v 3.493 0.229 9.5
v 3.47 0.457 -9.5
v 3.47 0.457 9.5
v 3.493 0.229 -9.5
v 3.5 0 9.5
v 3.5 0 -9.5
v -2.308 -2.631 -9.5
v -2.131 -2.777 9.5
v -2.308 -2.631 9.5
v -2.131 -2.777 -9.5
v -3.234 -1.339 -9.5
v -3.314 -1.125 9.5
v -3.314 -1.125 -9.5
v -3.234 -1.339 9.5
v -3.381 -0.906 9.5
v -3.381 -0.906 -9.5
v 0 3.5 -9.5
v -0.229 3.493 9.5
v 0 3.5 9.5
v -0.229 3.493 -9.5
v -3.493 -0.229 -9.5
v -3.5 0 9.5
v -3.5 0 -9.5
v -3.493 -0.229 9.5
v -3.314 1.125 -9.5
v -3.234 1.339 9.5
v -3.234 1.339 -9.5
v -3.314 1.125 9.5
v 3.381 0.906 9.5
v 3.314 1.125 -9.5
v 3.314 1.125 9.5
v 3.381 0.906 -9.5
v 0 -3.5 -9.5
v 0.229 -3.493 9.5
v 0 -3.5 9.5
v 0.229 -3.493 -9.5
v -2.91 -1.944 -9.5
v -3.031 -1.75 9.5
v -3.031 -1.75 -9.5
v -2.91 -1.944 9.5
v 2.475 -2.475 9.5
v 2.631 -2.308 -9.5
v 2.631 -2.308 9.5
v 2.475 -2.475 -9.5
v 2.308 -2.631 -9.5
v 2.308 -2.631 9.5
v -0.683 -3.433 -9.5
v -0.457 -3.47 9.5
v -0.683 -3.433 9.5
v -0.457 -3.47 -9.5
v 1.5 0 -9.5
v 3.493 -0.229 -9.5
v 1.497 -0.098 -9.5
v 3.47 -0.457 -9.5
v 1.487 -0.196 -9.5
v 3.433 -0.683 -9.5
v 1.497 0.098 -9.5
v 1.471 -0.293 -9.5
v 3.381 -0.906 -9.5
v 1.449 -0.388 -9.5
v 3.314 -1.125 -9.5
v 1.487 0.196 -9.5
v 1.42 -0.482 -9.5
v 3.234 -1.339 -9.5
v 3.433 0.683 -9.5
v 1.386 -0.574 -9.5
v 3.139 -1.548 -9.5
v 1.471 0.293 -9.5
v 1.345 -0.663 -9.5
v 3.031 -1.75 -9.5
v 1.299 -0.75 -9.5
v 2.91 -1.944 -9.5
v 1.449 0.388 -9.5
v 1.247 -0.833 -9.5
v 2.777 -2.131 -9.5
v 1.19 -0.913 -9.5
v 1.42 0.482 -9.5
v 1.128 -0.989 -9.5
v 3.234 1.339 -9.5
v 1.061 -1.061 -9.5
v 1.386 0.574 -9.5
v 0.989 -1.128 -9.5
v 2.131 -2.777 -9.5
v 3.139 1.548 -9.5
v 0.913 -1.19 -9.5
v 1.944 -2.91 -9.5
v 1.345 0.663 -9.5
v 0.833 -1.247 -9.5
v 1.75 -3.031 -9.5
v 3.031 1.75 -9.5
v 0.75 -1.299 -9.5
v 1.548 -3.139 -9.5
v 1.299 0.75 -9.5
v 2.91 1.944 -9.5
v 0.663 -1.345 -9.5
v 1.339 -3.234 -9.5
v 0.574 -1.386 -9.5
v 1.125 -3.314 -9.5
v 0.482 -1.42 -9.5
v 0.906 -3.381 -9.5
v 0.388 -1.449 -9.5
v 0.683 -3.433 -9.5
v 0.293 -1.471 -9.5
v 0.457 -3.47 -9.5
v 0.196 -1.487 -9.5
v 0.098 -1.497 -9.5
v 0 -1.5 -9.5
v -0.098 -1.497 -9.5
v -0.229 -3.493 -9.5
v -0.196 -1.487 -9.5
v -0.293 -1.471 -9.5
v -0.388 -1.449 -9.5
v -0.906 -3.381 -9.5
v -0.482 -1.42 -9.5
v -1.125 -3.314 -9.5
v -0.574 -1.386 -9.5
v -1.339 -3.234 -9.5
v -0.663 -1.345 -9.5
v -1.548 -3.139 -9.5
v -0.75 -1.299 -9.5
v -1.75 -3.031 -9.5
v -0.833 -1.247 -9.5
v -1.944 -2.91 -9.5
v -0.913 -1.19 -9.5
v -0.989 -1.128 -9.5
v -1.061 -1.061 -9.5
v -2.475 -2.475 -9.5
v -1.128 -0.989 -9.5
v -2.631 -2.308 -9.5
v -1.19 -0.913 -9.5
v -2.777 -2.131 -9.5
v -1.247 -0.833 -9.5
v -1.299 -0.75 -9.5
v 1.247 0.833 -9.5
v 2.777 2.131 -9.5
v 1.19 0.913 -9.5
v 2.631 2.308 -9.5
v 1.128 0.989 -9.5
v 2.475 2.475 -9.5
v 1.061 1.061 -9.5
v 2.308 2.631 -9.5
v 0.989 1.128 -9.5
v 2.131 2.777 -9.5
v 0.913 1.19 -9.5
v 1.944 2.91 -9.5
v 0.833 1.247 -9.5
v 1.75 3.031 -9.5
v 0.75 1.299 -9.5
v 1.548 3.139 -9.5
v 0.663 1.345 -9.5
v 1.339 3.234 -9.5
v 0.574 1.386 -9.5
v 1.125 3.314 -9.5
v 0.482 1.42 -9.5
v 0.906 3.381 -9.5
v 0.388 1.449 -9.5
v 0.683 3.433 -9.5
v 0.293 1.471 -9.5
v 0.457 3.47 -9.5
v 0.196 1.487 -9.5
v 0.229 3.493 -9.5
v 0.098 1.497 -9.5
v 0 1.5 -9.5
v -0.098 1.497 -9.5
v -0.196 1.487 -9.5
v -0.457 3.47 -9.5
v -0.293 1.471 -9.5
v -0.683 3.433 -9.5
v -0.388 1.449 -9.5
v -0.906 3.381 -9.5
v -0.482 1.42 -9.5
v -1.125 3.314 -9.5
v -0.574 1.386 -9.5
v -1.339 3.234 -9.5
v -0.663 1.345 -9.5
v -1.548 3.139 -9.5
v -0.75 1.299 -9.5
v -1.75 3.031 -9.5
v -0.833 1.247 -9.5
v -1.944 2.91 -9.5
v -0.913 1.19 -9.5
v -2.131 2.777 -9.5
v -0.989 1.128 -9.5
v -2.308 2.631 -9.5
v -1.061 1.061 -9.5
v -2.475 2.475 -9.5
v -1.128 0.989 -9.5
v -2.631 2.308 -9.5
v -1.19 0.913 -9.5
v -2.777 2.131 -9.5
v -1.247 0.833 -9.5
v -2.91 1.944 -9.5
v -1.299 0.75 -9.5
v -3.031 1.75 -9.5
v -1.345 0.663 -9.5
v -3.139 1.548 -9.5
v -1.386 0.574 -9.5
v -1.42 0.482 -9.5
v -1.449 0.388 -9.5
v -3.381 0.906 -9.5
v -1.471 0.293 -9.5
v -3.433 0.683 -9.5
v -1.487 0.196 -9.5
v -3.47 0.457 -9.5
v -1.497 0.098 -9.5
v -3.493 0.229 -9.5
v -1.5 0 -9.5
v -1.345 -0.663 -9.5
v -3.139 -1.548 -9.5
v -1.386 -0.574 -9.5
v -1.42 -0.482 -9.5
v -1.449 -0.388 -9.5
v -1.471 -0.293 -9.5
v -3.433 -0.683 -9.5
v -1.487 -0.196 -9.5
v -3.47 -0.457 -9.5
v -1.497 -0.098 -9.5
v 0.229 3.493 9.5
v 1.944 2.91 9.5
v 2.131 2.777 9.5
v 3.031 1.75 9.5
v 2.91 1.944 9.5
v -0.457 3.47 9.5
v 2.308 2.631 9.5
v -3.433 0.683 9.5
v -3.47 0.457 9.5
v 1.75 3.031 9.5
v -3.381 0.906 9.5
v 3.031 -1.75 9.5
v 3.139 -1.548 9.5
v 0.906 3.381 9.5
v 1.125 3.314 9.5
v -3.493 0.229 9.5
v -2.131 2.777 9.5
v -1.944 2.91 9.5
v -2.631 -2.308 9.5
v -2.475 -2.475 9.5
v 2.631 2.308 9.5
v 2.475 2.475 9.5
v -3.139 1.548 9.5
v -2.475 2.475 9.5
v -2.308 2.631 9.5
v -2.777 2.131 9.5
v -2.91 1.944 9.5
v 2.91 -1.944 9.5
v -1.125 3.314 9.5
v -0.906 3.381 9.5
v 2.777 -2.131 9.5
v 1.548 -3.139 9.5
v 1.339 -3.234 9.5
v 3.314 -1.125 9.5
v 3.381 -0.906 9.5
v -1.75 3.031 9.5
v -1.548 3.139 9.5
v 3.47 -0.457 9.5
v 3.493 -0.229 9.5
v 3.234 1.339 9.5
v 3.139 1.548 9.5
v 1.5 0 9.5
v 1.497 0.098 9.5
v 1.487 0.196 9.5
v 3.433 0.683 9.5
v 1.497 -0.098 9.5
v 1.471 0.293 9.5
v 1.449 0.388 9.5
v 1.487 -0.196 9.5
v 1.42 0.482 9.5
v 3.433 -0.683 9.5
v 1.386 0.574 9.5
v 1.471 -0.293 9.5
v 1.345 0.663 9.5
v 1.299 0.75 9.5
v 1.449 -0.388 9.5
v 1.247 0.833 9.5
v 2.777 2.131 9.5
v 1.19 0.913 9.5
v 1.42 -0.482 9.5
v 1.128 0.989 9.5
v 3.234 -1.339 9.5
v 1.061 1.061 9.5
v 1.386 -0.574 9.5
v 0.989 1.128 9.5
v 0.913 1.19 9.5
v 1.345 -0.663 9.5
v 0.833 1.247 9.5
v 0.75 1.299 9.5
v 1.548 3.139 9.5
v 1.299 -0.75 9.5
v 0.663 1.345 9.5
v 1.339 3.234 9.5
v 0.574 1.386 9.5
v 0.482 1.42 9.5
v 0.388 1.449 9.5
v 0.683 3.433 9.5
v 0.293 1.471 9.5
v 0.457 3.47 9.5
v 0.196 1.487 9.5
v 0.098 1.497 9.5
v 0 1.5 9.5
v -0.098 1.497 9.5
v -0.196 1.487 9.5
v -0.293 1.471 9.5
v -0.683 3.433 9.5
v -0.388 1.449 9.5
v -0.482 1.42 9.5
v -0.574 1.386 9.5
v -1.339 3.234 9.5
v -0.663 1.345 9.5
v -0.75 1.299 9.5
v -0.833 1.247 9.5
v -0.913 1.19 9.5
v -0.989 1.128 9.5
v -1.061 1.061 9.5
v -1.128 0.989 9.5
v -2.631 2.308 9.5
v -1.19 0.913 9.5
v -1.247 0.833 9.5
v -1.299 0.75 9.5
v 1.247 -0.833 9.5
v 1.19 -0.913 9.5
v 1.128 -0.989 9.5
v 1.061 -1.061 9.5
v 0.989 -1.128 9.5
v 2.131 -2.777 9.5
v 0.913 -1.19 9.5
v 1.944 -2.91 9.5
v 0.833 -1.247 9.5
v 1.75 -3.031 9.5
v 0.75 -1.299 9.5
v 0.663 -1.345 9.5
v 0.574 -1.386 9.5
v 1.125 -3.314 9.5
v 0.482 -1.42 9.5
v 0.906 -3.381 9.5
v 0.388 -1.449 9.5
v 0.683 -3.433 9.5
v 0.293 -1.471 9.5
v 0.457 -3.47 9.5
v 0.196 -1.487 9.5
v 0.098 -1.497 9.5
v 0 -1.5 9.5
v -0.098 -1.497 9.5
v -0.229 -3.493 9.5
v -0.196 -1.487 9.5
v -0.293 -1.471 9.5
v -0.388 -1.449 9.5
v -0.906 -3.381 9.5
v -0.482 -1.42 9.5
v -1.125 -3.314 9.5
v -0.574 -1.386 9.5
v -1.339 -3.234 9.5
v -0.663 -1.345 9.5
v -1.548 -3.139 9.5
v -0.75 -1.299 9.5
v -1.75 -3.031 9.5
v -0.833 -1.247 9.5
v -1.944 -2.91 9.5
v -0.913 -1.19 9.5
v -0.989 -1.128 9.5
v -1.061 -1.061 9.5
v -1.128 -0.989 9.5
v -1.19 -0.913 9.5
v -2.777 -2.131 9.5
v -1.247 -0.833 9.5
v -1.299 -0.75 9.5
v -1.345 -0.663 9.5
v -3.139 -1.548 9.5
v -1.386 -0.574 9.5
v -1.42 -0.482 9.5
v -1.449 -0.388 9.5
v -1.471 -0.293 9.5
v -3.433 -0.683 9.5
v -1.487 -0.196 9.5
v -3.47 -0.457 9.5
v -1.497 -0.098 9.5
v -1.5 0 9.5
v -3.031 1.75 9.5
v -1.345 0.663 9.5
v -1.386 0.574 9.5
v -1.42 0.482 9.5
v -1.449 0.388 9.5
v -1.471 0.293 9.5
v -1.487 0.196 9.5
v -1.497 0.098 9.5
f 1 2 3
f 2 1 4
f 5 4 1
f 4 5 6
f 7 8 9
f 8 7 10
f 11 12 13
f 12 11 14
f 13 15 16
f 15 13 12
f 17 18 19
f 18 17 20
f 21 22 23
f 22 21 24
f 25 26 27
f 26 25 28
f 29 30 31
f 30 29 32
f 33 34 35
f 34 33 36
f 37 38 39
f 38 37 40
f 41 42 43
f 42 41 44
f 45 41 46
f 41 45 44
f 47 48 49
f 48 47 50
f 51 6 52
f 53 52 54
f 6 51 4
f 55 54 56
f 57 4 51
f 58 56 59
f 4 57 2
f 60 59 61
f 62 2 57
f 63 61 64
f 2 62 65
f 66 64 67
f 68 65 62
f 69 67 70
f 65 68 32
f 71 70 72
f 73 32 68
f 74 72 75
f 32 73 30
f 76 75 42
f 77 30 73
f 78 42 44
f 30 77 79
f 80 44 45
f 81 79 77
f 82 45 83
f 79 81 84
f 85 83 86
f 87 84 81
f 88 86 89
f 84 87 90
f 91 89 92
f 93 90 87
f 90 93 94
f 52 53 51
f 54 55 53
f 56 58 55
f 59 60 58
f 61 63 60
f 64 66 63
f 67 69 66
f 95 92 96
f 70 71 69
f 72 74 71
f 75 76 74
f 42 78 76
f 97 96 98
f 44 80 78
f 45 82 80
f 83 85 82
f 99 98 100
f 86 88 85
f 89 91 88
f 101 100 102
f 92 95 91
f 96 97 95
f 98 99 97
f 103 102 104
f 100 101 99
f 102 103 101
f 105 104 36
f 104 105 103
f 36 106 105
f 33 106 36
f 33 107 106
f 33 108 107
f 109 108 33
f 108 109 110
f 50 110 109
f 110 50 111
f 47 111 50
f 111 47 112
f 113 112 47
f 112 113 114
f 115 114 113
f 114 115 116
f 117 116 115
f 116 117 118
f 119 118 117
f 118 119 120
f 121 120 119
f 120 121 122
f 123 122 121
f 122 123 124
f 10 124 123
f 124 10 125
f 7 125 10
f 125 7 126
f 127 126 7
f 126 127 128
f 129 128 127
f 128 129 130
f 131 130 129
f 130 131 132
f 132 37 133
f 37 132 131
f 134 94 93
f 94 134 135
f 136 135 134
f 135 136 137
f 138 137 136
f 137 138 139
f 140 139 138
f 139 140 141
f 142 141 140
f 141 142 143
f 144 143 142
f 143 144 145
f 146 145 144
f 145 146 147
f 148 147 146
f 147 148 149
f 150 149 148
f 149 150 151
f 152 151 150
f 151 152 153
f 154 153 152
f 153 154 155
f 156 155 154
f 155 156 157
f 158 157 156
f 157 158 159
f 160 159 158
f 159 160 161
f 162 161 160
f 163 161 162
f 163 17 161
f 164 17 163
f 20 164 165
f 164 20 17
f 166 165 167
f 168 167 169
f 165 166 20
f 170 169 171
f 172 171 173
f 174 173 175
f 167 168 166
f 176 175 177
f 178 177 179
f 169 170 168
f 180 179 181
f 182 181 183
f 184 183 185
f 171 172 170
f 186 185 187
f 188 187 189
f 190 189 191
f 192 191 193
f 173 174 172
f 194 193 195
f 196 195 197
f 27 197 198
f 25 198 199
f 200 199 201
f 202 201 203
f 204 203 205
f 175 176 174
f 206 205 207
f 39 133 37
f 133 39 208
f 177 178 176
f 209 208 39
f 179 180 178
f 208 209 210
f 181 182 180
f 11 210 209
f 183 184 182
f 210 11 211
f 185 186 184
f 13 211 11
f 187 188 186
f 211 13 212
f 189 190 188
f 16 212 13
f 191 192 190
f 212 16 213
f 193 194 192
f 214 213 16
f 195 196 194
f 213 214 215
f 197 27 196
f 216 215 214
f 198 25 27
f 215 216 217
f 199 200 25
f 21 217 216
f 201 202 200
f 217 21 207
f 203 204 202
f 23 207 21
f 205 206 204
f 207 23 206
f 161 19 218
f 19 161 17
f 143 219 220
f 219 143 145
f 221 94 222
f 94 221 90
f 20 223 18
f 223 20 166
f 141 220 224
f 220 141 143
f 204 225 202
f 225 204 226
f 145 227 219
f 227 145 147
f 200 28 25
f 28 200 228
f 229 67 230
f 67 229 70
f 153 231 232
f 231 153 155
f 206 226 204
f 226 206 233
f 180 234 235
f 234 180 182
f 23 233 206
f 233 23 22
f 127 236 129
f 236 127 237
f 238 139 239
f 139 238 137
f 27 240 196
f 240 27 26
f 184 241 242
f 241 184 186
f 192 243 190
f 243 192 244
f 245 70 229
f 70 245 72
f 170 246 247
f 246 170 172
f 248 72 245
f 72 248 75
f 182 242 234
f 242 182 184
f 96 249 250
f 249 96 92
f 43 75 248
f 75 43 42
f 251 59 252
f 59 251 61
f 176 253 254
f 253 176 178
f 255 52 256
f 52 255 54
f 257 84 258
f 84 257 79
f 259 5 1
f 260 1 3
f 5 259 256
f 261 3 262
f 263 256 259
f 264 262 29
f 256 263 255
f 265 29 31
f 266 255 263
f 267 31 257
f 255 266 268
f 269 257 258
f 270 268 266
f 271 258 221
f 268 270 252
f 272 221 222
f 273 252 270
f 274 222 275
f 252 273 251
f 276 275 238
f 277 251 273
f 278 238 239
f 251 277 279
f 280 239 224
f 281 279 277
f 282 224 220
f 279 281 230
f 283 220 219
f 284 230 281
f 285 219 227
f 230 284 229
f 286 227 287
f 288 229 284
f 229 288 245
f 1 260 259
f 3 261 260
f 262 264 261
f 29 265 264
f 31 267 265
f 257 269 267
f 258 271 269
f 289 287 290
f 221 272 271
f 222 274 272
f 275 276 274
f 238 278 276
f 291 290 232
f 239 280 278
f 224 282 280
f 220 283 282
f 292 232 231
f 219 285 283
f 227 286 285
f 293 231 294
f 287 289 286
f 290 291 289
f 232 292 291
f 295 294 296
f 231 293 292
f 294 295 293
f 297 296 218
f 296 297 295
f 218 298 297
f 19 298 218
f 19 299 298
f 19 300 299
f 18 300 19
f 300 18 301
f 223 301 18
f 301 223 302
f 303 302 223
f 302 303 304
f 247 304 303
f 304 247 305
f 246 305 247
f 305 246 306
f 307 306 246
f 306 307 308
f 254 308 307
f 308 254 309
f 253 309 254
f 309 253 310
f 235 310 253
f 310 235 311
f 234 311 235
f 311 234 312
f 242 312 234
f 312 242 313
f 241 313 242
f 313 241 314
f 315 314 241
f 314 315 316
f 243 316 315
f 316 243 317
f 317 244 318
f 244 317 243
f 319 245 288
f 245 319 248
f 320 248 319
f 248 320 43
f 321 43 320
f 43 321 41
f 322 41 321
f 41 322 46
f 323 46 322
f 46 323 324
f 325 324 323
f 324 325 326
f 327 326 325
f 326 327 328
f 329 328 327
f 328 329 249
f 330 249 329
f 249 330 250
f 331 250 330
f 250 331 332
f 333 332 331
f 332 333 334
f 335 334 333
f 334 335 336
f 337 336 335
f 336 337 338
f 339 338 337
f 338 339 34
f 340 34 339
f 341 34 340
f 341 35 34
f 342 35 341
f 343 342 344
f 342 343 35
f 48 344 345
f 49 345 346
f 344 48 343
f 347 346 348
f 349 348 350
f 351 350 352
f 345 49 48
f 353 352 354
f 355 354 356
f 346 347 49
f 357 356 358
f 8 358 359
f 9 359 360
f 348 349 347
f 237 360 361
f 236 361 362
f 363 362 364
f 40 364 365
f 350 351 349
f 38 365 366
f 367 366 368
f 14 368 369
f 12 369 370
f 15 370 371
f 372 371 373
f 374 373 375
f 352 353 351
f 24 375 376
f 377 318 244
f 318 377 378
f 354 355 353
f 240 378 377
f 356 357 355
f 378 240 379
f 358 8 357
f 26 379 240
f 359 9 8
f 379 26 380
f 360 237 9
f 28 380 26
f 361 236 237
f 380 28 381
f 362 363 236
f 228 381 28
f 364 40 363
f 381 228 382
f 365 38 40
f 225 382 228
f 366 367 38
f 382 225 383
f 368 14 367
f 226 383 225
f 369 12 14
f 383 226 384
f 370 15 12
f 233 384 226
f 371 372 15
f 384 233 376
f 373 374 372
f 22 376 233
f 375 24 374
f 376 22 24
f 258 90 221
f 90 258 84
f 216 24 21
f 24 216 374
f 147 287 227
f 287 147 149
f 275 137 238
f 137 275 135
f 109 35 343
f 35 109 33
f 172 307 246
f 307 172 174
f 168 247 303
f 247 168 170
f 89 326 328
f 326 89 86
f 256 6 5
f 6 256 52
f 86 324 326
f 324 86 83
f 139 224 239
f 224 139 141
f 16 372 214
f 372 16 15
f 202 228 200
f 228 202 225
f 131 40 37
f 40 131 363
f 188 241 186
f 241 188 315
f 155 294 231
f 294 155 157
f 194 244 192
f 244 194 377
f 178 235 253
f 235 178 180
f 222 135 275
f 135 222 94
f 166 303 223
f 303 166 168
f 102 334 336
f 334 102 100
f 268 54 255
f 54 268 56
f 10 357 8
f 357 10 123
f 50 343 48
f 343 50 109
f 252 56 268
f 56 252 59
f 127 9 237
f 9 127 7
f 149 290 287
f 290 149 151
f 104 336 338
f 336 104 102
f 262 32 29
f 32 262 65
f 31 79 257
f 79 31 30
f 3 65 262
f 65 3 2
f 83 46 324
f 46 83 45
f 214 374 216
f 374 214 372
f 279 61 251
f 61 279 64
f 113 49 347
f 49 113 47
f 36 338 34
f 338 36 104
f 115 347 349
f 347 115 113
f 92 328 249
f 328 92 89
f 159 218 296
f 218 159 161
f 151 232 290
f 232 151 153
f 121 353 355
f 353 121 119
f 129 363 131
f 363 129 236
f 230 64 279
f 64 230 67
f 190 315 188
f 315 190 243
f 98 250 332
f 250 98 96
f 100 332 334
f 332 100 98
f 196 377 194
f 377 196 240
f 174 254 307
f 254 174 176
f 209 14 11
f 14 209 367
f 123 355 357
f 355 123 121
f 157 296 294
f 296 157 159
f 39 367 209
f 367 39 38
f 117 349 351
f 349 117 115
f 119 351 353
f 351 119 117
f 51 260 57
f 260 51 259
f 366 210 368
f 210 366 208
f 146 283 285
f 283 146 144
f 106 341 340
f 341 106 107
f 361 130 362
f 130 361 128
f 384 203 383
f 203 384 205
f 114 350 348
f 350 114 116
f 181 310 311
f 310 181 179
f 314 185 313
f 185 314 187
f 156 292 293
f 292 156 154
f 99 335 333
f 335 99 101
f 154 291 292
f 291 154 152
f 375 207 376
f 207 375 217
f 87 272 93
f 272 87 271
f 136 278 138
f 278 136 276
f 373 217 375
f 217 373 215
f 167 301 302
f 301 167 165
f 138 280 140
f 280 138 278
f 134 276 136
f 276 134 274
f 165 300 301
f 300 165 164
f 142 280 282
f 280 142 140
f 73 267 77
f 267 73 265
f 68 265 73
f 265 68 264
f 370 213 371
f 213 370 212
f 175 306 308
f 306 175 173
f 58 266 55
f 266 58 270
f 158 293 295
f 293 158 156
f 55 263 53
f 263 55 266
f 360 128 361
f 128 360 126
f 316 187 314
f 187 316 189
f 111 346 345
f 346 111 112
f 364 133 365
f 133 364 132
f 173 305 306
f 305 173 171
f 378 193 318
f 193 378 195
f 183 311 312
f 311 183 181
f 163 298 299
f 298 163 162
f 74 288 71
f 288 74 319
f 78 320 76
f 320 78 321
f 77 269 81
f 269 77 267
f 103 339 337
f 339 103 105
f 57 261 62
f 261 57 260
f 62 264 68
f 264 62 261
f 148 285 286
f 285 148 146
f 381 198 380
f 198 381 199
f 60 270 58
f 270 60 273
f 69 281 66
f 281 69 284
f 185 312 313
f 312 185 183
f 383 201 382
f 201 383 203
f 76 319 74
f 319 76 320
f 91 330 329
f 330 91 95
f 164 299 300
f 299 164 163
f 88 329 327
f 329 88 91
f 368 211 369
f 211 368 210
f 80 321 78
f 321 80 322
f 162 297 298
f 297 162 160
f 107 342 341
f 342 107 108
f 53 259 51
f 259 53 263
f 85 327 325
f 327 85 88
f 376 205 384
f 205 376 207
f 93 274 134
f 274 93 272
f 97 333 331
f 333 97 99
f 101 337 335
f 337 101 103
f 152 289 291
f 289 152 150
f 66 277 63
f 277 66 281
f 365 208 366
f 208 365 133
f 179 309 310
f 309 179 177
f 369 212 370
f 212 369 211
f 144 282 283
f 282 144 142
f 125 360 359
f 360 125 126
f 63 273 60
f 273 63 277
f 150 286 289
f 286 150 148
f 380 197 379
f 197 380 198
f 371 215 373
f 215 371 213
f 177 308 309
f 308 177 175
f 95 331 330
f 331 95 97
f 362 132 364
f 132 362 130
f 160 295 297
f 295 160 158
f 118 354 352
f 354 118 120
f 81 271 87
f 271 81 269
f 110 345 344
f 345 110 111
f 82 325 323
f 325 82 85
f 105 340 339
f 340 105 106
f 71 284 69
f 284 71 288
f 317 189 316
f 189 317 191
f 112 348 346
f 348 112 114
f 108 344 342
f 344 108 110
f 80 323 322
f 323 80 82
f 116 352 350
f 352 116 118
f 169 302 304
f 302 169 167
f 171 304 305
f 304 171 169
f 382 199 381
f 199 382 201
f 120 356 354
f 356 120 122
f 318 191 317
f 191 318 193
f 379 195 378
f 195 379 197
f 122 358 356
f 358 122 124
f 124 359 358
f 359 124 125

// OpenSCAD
// Long linear bearing: 3.0mm bore, 7.0mm OD, 19.0mm length
// One connected solid (bearing body only)

// Parameters
bore_diameter_mm  = 3.0;  //[1.5:6.0:0.1]
outer_diameter_mm = 7.0;  //[3.5:14.0:0.1]
length_mm         = 19.0; //[9.5:38.0:0.1]
centered          = 1;    //[0:1:1]

grooves_enabled   = 0;    //[0:1:1]
groove_count      = 0;    //[0:2:1]
groove_diameter_mm= 6.2;  //[4.0:13.5:0.1]
groove_length_mm  = 2.0;  //[0.5:6.0:0.1]
groove_spacing_mm = 12.0; //[4.0:30.0:0.1]

eps_mm            = 0.2;  //[0.05:0.5:0.05]
overlap_mm        = 0.2;  //[0.05:1.0:0.05]

$fn = 96;

module linear_bearing() {
  zc = centered ? 0 : length_mm/2;

  color([0.85, 0.85, 0.8])
  translate([0, 0, zc])
  difference() {
    // Outer body
    cylinder(h=length_mm, r=outer_diameter_mm/2, center=true);

    // Through bore
    cylinder(h=length_mm + 2*eps_mm, r=bore_diameter_mm/2, center=true);

    // Optional external grooves (cut into OD)
    if (grooves_enabled && groove_count > 0) {
      for (i = [0:groove_count-1]) {
        zpos = (groove_count==1)
          ? 0
          : (- (groove_count-1)/2 + i) * groove_spacing_mm;

        translate([0, 0, zpos])
          difference() {
            // Remove a ring from the OD region
            cylinder(h=groove_length_mm, r=outer_diameter_mm/2 + eps_mm, center=true);
            // Keep inner portion up to groove diameter
            cylinder(h=groove_length_mm + 2*eps_mm, r=groove_diameter_mm/2, center=true);
          }
      }
    }
  }
}

linear_bearing();
